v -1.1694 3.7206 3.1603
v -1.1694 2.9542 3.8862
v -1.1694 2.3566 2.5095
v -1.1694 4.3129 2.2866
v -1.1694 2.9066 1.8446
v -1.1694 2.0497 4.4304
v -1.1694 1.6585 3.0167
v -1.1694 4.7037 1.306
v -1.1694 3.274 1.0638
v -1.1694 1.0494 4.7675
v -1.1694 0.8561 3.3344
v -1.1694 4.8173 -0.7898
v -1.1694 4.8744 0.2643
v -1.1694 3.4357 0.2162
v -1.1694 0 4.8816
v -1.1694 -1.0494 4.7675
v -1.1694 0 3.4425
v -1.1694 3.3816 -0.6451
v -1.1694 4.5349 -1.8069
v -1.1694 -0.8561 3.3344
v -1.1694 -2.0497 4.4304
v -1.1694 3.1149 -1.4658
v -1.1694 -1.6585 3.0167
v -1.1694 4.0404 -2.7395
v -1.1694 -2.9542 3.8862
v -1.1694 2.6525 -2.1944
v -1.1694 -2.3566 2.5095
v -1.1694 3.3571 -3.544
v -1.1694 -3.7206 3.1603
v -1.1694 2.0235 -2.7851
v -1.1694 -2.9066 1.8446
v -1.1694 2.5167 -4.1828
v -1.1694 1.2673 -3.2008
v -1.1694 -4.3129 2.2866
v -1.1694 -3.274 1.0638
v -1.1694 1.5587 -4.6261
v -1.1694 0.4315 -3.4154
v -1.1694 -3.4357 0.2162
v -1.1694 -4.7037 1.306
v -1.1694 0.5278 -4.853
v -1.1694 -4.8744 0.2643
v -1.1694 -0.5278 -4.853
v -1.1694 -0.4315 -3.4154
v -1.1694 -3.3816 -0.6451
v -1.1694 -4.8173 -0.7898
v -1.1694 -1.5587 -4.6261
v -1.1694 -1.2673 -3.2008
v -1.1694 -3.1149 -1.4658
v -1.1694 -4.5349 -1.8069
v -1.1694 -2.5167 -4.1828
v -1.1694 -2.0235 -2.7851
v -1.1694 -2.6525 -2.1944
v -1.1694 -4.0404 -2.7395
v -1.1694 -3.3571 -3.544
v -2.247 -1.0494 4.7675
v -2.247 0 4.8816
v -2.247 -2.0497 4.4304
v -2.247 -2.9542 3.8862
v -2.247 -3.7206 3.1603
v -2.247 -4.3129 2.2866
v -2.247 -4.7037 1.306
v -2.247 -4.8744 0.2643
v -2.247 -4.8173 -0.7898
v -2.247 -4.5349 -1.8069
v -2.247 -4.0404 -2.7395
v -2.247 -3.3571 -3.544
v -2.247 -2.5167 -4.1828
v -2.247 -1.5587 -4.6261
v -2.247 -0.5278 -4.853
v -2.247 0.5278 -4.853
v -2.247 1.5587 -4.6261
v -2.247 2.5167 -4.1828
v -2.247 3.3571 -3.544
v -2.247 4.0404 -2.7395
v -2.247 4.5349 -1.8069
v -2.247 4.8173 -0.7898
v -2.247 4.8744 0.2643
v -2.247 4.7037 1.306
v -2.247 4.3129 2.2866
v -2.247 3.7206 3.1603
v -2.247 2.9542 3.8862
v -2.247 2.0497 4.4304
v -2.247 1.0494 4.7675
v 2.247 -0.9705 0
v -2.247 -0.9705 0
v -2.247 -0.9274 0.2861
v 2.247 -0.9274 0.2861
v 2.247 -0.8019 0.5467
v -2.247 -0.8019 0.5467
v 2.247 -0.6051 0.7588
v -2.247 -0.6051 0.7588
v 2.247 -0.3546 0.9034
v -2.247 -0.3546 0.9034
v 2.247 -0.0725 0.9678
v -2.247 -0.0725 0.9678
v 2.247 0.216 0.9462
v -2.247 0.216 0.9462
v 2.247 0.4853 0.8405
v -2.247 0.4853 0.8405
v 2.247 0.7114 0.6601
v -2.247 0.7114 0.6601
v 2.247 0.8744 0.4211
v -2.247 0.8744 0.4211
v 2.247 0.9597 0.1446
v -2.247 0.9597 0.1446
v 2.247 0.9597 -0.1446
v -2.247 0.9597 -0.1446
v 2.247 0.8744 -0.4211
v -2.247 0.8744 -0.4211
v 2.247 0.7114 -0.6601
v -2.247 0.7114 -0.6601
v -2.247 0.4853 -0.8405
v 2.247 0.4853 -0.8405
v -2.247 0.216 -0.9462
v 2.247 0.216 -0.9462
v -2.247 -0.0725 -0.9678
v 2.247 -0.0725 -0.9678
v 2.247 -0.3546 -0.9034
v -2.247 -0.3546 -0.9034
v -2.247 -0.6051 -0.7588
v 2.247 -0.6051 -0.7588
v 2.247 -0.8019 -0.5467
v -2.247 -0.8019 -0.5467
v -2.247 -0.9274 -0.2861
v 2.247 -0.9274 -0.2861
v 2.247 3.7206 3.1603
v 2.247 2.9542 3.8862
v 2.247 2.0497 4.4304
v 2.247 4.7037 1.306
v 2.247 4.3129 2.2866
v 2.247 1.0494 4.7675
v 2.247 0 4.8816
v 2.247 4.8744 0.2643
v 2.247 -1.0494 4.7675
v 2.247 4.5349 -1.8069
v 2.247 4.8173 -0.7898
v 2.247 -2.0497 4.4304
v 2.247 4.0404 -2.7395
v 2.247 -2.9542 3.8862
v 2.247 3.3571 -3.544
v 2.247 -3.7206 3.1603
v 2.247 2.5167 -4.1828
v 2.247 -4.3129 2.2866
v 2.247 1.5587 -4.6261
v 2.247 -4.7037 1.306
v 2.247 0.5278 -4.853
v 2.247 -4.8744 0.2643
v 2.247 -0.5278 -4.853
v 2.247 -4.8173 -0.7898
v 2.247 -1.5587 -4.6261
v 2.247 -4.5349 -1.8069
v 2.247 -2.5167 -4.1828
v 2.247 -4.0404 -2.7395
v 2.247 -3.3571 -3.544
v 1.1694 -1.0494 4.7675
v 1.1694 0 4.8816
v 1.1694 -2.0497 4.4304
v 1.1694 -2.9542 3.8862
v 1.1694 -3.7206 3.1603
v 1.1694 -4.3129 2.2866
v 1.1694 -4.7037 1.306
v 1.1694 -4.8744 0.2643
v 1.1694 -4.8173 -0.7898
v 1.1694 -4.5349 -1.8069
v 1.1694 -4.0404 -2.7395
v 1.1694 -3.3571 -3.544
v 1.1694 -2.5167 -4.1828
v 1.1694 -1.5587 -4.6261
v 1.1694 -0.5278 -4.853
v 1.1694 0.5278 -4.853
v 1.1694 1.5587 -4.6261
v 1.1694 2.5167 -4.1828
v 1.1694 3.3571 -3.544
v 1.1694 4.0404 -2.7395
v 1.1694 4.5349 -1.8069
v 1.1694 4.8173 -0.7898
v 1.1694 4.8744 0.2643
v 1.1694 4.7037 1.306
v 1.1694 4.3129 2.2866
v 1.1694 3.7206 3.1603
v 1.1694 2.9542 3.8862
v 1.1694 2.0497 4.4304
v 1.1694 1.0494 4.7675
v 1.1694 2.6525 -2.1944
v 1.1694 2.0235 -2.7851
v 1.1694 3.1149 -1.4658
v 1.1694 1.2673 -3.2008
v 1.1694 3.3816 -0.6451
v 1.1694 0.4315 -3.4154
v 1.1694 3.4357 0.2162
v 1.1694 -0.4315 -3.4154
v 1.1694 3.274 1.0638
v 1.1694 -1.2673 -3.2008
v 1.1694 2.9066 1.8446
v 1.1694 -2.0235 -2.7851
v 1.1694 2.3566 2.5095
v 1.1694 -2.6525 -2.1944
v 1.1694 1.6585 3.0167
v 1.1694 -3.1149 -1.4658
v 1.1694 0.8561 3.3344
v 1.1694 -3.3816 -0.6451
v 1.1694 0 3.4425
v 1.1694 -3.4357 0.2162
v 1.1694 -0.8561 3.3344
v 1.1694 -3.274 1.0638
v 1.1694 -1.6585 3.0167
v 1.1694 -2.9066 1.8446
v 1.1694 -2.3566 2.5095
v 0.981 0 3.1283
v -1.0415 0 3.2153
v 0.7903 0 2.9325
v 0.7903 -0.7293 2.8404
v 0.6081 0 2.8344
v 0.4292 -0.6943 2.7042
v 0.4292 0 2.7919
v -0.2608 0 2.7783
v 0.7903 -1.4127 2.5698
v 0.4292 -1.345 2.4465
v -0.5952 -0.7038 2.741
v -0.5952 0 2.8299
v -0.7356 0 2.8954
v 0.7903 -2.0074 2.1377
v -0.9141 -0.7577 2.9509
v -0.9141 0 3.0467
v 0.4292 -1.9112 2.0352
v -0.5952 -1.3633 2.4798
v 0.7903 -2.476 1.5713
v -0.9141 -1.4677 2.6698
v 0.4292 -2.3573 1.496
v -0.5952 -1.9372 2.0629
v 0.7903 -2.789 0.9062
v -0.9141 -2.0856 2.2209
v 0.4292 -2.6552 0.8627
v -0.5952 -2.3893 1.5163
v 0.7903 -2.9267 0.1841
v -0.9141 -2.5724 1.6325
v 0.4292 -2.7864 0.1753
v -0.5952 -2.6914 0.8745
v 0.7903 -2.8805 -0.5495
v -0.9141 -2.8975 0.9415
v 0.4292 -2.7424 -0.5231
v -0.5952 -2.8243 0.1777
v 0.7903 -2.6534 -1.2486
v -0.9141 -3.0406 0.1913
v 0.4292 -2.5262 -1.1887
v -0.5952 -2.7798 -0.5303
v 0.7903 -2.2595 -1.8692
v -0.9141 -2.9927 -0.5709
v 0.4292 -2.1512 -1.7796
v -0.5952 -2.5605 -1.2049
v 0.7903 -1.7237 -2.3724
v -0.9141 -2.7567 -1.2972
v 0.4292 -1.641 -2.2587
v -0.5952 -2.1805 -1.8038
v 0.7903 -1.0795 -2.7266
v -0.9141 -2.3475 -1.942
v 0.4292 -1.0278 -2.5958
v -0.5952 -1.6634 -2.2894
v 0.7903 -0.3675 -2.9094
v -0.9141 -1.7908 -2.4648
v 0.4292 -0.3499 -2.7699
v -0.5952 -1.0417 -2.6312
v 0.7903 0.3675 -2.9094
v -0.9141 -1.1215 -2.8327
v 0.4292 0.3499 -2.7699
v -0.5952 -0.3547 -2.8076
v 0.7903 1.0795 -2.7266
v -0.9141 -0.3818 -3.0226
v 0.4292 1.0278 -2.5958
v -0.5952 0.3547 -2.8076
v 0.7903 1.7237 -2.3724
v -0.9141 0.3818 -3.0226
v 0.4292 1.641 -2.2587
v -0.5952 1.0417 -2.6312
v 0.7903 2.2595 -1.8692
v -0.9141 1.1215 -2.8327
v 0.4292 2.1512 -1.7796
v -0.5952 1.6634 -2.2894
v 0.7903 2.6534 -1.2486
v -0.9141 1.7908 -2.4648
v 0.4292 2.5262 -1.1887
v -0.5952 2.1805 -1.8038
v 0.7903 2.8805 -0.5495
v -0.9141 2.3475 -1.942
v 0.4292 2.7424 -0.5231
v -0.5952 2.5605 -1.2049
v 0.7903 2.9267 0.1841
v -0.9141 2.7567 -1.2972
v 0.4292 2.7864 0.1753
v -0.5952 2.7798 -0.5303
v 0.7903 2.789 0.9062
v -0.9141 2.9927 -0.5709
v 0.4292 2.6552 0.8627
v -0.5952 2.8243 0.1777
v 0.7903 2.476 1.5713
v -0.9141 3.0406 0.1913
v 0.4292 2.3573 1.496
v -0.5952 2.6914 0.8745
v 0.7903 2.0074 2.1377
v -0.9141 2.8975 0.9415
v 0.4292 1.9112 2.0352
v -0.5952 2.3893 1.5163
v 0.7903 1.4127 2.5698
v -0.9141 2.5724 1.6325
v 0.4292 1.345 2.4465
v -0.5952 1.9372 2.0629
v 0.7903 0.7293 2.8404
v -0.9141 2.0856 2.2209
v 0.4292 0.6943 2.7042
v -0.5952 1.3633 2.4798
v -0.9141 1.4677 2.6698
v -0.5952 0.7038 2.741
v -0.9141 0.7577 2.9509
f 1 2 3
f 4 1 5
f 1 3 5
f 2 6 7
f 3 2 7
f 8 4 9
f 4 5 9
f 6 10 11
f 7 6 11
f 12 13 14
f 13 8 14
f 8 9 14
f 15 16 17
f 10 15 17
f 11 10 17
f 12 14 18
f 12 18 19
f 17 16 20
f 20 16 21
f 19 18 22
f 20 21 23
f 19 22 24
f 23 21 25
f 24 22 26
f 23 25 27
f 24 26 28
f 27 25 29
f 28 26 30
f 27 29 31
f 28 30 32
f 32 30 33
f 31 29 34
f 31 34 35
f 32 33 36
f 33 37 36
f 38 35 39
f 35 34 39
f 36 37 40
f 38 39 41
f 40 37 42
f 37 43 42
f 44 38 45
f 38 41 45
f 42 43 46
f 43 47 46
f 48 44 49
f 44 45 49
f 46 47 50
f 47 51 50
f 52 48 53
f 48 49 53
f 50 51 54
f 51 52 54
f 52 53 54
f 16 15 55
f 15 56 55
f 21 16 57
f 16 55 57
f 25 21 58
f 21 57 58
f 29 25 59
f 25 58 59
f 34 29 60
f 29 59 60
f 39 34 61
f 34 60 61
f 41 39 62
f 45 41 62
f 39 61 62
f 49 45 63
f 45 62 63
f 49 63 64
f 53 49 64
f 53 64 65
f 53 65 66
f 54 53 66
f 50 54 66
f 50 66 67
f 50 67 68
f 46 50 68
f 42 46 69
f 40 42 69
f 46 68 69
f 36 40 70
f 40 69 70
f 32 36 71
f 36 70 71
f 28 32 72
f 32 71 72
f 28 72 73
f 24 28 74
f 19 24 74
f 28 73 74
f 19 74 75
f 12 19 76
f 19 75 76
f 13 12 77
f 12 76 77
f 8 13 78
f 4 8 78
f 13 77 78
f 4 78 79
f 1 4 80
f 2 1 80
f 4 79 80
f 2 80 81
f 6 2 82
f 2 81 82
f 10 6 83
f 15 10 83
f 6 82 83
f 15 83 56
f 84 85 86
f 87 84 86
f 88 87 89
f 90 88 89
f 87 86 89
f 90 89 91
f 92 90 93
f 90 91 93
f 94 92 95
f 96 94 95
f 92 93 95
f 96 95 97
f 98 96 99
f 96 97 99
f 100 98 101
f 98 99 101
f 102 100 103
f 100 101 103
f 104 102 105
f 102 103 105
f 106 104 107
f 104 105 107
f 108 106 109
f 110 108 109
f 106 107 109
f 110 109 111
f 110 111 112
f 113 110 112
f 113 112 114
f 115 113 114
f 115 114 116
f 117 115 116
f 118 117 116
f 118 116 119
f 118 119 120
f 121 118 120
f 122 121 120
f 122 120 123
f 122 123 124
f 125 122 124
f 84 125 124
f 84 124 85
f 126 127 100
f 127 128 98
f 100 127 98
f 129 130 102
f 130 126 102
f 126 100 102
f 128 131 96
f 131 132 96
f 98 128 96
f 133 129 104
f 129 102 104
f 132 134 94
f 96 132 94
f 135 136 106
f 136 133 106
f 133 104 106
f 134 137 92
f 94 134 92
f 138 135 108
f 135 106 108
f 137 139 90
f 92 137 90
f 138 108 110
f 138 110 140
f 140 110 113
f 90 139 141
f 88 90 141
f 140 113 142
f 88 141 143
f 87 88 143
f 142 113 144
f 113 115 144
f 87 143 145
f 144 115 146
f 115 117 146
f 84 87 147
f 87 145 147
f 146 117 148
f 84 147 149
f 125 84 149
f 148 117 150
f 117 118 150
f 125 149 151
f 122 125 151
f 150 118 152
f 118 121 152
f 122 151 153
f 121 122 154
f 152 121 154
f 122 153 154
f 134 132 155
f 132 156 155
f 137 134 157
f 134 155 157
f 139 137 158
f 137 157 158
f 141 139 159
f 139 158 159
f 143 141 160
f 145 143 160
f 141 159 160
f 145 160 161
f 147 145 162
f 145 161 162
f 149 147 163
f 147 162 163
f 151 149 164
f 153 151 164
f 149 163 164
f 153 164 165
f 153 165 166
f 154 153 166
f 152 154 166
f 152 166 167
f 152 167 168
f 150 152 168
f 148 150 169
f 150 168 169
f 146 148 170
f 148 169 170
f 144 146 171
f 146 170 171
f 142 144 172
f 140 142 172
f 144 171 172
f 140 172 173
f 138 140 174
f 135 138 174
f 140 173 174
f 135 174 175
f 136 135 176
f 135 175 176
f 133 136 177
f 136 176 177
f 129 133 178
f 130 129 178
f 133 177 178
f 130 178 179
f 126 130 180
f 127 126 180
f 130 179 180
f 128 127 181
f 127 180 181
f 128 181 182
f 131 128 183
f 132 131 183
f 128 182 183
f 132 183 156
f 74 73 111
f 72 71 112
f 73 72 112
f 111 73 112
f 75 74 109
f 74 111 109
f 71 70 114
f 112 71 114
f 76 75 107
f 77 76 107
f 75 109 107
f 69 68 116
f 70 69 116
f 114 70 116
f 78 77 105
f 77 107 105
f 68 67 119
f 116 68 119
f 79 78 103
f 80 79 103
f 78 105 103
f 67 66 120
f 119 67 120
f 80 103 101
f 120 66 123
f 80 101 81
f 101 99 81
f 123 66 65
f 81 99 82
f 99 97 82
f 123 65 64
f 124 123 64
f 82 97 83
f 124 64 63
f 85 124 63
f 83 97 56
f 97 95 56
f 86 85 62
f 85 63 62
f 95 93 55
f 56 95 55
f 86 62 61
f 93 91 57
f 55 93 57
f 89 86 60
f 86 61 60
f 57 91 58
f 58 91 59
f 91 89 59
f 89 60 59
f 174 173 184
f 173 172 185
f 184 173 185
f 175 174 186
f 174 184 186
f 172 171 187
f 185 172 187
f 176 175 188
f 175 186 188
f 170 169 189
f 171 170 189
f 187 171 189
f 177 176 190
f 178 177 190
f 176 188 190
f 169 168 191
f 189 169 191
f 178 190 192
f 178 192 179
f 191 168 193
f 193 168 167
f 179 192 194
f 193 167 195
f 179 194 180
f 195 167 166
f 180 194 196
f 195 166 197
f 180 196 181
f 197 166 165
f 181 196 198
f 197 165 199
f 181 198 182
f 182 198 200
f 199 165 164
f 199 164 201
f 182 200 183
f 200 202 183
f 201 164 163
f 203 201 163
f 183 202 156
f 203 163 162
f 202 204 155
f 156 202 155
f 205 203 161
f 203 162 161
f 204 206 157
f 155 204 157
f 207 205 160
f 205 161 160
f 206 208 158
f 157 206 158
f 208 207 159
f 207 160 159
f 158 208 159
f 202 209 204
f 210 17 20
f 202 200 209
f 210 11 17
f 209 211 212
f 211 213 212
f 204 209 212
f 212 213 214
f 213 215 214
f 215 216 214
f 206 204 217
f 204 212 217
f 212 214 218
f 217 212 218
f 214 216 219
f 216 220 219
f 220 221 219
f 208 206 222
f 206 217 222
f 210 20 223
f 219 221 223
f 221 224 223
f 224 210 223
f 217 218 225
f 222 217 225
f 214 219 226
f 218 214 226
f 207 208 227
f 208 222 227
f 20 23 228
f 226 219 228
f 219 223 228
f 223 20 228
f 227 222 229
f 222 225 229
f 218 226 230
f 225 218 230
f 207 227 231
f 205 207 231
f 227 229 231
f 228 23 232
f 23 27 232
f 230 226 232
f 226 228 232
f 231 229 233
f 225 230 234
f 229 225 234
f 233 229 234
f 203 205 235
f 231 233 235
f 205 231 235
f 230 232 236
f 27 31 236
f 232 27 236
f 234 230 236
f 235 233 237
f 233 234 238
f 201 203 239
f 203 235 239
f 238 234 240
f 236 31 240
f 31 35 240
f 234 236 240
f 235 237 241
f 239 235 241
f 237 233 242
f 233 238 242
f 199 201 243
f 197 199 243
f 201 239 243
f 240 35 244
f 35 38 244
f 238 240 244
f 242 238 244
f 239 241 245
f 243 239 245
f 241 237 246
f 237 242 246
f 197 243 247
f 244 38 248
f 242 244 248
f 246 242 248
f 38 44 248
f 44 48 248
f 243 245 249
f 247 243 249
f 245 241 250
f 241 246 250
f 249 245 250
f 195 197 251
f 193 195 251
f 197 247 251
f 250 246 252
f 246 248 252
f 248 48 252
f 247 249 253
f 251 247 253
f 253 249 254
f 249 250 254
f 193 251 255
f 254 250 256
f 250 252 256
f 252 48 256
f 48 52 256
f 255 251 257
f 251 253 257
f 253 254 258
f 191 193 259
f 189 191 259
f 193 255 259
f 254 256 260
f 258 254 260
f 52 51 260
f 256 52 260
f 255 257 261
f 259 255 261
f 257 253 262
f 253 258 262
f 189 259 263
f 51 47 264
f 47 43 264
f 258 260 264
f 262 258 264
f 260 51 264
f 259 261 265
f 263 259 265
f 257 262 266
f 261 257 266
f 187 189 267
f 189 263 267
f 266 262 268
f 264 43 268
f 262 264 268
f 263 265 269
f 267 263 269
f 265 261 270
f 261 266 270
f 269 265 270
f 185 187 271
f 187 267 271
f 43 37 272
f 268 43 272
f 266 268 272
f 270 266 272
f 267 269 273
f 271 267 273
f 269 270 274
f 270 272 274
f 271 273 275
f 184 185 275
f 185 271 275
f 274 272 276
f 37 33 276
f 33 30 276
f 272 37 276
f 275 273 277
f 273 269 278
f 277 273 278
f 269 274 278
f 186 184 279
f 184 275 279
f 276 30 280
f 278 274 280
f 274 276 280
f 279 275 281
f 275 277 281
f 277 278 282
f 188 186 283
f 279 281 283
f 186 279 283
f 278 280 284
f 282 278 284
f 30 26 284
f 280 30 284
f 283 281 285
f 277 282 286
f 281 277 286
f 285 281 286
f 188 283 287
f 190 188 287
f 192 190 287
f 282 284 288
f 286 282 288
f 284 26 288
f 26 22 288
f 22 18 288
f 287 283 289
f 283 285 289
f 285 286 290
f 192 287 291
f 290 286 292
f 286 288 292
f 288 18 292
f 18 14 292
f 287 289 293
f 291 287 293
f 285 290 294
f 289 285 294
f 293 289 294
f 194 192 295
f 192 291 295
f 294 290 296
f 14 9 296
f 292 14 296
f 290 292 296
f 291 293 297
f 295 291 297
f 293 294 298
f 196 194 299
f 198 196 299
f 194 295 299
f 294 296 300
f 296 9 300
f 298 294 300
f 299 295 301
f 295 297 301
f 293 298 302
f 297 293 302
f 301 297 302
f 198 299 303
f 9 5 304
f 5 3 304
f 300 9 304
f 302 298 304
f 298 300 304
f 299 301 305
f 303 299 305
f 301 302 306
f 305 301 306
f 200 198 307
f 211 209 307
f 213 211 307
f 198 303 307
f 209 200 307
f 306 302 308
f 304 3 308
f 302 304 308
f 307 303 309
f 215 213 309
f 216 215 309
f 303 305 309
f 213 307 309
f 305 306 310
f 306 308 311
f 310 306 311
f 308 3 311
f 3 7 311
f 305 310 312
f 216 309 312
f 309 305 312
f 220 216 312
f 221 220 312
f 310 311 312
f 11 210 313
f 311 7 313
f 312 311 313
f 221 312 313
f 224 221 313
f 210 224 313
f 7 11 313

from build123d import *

# Parameters (mm, degrees)
F2_R     = 0.970502
F3_DEPTH = 25.4


with BuildPart() as f1:
    # F0 (on Front) → F1 (revolve)
    with BuildSketch(Plane.XZ):
        Polygon((-1.169414, 4.881596), (-2.247044, 4.881596), (-2.247044, 0), (-1.169414, 0), (-1.169414, 3.44253), align=None)
        with BuildLine():
            add(Edge.make_bspline(
                [(-1.169414, 3.44253), (-0.829342, 2.759905), (-0.527717, 2.77578), (0, 2.77578)],
                knots=[0, 0, 0, 0, 1.346137, 1.346137, 1.346137, 1.346137], degree=3))
            Line((-1.169414, 3.44253), (-1.169414, 0))
            Line((-1.169414, 0), (1.169414, 0))
            Line((1.169414, 0), (1.169414, 3.44253))
            add(Edge.make_bspline(
                [(1.169414, 3.44253), (0.829342, 2.759905), (0.527717, 2.77578), (0, 2.77578)],
                knots=[0, 0, 0, 0, 1.346137, 1.346137, 1.346137, 1.346137], degree=3))
        make_face()
        Polygon((1.169414, 3.44253), (1.169414, 0), (2.247044, 0), (2.247044, 4.881596), (1.169414, 4.881596), align=None)
    revolve(axis=Axis((0, 0, 0), (1, 0, 0)))

    # F2 (on face) → F3 (cut)
    with BuildSketch(Plane(origin=(-2.247044, 0, 0), x_dir=(0, -1, 0), z_dir=(-1, 0, 0))):
        Circle(F2_R)
    extrude(amount=-F3_DEPTH, mode=Mode.SUBTRACT)


solid = f1.part
